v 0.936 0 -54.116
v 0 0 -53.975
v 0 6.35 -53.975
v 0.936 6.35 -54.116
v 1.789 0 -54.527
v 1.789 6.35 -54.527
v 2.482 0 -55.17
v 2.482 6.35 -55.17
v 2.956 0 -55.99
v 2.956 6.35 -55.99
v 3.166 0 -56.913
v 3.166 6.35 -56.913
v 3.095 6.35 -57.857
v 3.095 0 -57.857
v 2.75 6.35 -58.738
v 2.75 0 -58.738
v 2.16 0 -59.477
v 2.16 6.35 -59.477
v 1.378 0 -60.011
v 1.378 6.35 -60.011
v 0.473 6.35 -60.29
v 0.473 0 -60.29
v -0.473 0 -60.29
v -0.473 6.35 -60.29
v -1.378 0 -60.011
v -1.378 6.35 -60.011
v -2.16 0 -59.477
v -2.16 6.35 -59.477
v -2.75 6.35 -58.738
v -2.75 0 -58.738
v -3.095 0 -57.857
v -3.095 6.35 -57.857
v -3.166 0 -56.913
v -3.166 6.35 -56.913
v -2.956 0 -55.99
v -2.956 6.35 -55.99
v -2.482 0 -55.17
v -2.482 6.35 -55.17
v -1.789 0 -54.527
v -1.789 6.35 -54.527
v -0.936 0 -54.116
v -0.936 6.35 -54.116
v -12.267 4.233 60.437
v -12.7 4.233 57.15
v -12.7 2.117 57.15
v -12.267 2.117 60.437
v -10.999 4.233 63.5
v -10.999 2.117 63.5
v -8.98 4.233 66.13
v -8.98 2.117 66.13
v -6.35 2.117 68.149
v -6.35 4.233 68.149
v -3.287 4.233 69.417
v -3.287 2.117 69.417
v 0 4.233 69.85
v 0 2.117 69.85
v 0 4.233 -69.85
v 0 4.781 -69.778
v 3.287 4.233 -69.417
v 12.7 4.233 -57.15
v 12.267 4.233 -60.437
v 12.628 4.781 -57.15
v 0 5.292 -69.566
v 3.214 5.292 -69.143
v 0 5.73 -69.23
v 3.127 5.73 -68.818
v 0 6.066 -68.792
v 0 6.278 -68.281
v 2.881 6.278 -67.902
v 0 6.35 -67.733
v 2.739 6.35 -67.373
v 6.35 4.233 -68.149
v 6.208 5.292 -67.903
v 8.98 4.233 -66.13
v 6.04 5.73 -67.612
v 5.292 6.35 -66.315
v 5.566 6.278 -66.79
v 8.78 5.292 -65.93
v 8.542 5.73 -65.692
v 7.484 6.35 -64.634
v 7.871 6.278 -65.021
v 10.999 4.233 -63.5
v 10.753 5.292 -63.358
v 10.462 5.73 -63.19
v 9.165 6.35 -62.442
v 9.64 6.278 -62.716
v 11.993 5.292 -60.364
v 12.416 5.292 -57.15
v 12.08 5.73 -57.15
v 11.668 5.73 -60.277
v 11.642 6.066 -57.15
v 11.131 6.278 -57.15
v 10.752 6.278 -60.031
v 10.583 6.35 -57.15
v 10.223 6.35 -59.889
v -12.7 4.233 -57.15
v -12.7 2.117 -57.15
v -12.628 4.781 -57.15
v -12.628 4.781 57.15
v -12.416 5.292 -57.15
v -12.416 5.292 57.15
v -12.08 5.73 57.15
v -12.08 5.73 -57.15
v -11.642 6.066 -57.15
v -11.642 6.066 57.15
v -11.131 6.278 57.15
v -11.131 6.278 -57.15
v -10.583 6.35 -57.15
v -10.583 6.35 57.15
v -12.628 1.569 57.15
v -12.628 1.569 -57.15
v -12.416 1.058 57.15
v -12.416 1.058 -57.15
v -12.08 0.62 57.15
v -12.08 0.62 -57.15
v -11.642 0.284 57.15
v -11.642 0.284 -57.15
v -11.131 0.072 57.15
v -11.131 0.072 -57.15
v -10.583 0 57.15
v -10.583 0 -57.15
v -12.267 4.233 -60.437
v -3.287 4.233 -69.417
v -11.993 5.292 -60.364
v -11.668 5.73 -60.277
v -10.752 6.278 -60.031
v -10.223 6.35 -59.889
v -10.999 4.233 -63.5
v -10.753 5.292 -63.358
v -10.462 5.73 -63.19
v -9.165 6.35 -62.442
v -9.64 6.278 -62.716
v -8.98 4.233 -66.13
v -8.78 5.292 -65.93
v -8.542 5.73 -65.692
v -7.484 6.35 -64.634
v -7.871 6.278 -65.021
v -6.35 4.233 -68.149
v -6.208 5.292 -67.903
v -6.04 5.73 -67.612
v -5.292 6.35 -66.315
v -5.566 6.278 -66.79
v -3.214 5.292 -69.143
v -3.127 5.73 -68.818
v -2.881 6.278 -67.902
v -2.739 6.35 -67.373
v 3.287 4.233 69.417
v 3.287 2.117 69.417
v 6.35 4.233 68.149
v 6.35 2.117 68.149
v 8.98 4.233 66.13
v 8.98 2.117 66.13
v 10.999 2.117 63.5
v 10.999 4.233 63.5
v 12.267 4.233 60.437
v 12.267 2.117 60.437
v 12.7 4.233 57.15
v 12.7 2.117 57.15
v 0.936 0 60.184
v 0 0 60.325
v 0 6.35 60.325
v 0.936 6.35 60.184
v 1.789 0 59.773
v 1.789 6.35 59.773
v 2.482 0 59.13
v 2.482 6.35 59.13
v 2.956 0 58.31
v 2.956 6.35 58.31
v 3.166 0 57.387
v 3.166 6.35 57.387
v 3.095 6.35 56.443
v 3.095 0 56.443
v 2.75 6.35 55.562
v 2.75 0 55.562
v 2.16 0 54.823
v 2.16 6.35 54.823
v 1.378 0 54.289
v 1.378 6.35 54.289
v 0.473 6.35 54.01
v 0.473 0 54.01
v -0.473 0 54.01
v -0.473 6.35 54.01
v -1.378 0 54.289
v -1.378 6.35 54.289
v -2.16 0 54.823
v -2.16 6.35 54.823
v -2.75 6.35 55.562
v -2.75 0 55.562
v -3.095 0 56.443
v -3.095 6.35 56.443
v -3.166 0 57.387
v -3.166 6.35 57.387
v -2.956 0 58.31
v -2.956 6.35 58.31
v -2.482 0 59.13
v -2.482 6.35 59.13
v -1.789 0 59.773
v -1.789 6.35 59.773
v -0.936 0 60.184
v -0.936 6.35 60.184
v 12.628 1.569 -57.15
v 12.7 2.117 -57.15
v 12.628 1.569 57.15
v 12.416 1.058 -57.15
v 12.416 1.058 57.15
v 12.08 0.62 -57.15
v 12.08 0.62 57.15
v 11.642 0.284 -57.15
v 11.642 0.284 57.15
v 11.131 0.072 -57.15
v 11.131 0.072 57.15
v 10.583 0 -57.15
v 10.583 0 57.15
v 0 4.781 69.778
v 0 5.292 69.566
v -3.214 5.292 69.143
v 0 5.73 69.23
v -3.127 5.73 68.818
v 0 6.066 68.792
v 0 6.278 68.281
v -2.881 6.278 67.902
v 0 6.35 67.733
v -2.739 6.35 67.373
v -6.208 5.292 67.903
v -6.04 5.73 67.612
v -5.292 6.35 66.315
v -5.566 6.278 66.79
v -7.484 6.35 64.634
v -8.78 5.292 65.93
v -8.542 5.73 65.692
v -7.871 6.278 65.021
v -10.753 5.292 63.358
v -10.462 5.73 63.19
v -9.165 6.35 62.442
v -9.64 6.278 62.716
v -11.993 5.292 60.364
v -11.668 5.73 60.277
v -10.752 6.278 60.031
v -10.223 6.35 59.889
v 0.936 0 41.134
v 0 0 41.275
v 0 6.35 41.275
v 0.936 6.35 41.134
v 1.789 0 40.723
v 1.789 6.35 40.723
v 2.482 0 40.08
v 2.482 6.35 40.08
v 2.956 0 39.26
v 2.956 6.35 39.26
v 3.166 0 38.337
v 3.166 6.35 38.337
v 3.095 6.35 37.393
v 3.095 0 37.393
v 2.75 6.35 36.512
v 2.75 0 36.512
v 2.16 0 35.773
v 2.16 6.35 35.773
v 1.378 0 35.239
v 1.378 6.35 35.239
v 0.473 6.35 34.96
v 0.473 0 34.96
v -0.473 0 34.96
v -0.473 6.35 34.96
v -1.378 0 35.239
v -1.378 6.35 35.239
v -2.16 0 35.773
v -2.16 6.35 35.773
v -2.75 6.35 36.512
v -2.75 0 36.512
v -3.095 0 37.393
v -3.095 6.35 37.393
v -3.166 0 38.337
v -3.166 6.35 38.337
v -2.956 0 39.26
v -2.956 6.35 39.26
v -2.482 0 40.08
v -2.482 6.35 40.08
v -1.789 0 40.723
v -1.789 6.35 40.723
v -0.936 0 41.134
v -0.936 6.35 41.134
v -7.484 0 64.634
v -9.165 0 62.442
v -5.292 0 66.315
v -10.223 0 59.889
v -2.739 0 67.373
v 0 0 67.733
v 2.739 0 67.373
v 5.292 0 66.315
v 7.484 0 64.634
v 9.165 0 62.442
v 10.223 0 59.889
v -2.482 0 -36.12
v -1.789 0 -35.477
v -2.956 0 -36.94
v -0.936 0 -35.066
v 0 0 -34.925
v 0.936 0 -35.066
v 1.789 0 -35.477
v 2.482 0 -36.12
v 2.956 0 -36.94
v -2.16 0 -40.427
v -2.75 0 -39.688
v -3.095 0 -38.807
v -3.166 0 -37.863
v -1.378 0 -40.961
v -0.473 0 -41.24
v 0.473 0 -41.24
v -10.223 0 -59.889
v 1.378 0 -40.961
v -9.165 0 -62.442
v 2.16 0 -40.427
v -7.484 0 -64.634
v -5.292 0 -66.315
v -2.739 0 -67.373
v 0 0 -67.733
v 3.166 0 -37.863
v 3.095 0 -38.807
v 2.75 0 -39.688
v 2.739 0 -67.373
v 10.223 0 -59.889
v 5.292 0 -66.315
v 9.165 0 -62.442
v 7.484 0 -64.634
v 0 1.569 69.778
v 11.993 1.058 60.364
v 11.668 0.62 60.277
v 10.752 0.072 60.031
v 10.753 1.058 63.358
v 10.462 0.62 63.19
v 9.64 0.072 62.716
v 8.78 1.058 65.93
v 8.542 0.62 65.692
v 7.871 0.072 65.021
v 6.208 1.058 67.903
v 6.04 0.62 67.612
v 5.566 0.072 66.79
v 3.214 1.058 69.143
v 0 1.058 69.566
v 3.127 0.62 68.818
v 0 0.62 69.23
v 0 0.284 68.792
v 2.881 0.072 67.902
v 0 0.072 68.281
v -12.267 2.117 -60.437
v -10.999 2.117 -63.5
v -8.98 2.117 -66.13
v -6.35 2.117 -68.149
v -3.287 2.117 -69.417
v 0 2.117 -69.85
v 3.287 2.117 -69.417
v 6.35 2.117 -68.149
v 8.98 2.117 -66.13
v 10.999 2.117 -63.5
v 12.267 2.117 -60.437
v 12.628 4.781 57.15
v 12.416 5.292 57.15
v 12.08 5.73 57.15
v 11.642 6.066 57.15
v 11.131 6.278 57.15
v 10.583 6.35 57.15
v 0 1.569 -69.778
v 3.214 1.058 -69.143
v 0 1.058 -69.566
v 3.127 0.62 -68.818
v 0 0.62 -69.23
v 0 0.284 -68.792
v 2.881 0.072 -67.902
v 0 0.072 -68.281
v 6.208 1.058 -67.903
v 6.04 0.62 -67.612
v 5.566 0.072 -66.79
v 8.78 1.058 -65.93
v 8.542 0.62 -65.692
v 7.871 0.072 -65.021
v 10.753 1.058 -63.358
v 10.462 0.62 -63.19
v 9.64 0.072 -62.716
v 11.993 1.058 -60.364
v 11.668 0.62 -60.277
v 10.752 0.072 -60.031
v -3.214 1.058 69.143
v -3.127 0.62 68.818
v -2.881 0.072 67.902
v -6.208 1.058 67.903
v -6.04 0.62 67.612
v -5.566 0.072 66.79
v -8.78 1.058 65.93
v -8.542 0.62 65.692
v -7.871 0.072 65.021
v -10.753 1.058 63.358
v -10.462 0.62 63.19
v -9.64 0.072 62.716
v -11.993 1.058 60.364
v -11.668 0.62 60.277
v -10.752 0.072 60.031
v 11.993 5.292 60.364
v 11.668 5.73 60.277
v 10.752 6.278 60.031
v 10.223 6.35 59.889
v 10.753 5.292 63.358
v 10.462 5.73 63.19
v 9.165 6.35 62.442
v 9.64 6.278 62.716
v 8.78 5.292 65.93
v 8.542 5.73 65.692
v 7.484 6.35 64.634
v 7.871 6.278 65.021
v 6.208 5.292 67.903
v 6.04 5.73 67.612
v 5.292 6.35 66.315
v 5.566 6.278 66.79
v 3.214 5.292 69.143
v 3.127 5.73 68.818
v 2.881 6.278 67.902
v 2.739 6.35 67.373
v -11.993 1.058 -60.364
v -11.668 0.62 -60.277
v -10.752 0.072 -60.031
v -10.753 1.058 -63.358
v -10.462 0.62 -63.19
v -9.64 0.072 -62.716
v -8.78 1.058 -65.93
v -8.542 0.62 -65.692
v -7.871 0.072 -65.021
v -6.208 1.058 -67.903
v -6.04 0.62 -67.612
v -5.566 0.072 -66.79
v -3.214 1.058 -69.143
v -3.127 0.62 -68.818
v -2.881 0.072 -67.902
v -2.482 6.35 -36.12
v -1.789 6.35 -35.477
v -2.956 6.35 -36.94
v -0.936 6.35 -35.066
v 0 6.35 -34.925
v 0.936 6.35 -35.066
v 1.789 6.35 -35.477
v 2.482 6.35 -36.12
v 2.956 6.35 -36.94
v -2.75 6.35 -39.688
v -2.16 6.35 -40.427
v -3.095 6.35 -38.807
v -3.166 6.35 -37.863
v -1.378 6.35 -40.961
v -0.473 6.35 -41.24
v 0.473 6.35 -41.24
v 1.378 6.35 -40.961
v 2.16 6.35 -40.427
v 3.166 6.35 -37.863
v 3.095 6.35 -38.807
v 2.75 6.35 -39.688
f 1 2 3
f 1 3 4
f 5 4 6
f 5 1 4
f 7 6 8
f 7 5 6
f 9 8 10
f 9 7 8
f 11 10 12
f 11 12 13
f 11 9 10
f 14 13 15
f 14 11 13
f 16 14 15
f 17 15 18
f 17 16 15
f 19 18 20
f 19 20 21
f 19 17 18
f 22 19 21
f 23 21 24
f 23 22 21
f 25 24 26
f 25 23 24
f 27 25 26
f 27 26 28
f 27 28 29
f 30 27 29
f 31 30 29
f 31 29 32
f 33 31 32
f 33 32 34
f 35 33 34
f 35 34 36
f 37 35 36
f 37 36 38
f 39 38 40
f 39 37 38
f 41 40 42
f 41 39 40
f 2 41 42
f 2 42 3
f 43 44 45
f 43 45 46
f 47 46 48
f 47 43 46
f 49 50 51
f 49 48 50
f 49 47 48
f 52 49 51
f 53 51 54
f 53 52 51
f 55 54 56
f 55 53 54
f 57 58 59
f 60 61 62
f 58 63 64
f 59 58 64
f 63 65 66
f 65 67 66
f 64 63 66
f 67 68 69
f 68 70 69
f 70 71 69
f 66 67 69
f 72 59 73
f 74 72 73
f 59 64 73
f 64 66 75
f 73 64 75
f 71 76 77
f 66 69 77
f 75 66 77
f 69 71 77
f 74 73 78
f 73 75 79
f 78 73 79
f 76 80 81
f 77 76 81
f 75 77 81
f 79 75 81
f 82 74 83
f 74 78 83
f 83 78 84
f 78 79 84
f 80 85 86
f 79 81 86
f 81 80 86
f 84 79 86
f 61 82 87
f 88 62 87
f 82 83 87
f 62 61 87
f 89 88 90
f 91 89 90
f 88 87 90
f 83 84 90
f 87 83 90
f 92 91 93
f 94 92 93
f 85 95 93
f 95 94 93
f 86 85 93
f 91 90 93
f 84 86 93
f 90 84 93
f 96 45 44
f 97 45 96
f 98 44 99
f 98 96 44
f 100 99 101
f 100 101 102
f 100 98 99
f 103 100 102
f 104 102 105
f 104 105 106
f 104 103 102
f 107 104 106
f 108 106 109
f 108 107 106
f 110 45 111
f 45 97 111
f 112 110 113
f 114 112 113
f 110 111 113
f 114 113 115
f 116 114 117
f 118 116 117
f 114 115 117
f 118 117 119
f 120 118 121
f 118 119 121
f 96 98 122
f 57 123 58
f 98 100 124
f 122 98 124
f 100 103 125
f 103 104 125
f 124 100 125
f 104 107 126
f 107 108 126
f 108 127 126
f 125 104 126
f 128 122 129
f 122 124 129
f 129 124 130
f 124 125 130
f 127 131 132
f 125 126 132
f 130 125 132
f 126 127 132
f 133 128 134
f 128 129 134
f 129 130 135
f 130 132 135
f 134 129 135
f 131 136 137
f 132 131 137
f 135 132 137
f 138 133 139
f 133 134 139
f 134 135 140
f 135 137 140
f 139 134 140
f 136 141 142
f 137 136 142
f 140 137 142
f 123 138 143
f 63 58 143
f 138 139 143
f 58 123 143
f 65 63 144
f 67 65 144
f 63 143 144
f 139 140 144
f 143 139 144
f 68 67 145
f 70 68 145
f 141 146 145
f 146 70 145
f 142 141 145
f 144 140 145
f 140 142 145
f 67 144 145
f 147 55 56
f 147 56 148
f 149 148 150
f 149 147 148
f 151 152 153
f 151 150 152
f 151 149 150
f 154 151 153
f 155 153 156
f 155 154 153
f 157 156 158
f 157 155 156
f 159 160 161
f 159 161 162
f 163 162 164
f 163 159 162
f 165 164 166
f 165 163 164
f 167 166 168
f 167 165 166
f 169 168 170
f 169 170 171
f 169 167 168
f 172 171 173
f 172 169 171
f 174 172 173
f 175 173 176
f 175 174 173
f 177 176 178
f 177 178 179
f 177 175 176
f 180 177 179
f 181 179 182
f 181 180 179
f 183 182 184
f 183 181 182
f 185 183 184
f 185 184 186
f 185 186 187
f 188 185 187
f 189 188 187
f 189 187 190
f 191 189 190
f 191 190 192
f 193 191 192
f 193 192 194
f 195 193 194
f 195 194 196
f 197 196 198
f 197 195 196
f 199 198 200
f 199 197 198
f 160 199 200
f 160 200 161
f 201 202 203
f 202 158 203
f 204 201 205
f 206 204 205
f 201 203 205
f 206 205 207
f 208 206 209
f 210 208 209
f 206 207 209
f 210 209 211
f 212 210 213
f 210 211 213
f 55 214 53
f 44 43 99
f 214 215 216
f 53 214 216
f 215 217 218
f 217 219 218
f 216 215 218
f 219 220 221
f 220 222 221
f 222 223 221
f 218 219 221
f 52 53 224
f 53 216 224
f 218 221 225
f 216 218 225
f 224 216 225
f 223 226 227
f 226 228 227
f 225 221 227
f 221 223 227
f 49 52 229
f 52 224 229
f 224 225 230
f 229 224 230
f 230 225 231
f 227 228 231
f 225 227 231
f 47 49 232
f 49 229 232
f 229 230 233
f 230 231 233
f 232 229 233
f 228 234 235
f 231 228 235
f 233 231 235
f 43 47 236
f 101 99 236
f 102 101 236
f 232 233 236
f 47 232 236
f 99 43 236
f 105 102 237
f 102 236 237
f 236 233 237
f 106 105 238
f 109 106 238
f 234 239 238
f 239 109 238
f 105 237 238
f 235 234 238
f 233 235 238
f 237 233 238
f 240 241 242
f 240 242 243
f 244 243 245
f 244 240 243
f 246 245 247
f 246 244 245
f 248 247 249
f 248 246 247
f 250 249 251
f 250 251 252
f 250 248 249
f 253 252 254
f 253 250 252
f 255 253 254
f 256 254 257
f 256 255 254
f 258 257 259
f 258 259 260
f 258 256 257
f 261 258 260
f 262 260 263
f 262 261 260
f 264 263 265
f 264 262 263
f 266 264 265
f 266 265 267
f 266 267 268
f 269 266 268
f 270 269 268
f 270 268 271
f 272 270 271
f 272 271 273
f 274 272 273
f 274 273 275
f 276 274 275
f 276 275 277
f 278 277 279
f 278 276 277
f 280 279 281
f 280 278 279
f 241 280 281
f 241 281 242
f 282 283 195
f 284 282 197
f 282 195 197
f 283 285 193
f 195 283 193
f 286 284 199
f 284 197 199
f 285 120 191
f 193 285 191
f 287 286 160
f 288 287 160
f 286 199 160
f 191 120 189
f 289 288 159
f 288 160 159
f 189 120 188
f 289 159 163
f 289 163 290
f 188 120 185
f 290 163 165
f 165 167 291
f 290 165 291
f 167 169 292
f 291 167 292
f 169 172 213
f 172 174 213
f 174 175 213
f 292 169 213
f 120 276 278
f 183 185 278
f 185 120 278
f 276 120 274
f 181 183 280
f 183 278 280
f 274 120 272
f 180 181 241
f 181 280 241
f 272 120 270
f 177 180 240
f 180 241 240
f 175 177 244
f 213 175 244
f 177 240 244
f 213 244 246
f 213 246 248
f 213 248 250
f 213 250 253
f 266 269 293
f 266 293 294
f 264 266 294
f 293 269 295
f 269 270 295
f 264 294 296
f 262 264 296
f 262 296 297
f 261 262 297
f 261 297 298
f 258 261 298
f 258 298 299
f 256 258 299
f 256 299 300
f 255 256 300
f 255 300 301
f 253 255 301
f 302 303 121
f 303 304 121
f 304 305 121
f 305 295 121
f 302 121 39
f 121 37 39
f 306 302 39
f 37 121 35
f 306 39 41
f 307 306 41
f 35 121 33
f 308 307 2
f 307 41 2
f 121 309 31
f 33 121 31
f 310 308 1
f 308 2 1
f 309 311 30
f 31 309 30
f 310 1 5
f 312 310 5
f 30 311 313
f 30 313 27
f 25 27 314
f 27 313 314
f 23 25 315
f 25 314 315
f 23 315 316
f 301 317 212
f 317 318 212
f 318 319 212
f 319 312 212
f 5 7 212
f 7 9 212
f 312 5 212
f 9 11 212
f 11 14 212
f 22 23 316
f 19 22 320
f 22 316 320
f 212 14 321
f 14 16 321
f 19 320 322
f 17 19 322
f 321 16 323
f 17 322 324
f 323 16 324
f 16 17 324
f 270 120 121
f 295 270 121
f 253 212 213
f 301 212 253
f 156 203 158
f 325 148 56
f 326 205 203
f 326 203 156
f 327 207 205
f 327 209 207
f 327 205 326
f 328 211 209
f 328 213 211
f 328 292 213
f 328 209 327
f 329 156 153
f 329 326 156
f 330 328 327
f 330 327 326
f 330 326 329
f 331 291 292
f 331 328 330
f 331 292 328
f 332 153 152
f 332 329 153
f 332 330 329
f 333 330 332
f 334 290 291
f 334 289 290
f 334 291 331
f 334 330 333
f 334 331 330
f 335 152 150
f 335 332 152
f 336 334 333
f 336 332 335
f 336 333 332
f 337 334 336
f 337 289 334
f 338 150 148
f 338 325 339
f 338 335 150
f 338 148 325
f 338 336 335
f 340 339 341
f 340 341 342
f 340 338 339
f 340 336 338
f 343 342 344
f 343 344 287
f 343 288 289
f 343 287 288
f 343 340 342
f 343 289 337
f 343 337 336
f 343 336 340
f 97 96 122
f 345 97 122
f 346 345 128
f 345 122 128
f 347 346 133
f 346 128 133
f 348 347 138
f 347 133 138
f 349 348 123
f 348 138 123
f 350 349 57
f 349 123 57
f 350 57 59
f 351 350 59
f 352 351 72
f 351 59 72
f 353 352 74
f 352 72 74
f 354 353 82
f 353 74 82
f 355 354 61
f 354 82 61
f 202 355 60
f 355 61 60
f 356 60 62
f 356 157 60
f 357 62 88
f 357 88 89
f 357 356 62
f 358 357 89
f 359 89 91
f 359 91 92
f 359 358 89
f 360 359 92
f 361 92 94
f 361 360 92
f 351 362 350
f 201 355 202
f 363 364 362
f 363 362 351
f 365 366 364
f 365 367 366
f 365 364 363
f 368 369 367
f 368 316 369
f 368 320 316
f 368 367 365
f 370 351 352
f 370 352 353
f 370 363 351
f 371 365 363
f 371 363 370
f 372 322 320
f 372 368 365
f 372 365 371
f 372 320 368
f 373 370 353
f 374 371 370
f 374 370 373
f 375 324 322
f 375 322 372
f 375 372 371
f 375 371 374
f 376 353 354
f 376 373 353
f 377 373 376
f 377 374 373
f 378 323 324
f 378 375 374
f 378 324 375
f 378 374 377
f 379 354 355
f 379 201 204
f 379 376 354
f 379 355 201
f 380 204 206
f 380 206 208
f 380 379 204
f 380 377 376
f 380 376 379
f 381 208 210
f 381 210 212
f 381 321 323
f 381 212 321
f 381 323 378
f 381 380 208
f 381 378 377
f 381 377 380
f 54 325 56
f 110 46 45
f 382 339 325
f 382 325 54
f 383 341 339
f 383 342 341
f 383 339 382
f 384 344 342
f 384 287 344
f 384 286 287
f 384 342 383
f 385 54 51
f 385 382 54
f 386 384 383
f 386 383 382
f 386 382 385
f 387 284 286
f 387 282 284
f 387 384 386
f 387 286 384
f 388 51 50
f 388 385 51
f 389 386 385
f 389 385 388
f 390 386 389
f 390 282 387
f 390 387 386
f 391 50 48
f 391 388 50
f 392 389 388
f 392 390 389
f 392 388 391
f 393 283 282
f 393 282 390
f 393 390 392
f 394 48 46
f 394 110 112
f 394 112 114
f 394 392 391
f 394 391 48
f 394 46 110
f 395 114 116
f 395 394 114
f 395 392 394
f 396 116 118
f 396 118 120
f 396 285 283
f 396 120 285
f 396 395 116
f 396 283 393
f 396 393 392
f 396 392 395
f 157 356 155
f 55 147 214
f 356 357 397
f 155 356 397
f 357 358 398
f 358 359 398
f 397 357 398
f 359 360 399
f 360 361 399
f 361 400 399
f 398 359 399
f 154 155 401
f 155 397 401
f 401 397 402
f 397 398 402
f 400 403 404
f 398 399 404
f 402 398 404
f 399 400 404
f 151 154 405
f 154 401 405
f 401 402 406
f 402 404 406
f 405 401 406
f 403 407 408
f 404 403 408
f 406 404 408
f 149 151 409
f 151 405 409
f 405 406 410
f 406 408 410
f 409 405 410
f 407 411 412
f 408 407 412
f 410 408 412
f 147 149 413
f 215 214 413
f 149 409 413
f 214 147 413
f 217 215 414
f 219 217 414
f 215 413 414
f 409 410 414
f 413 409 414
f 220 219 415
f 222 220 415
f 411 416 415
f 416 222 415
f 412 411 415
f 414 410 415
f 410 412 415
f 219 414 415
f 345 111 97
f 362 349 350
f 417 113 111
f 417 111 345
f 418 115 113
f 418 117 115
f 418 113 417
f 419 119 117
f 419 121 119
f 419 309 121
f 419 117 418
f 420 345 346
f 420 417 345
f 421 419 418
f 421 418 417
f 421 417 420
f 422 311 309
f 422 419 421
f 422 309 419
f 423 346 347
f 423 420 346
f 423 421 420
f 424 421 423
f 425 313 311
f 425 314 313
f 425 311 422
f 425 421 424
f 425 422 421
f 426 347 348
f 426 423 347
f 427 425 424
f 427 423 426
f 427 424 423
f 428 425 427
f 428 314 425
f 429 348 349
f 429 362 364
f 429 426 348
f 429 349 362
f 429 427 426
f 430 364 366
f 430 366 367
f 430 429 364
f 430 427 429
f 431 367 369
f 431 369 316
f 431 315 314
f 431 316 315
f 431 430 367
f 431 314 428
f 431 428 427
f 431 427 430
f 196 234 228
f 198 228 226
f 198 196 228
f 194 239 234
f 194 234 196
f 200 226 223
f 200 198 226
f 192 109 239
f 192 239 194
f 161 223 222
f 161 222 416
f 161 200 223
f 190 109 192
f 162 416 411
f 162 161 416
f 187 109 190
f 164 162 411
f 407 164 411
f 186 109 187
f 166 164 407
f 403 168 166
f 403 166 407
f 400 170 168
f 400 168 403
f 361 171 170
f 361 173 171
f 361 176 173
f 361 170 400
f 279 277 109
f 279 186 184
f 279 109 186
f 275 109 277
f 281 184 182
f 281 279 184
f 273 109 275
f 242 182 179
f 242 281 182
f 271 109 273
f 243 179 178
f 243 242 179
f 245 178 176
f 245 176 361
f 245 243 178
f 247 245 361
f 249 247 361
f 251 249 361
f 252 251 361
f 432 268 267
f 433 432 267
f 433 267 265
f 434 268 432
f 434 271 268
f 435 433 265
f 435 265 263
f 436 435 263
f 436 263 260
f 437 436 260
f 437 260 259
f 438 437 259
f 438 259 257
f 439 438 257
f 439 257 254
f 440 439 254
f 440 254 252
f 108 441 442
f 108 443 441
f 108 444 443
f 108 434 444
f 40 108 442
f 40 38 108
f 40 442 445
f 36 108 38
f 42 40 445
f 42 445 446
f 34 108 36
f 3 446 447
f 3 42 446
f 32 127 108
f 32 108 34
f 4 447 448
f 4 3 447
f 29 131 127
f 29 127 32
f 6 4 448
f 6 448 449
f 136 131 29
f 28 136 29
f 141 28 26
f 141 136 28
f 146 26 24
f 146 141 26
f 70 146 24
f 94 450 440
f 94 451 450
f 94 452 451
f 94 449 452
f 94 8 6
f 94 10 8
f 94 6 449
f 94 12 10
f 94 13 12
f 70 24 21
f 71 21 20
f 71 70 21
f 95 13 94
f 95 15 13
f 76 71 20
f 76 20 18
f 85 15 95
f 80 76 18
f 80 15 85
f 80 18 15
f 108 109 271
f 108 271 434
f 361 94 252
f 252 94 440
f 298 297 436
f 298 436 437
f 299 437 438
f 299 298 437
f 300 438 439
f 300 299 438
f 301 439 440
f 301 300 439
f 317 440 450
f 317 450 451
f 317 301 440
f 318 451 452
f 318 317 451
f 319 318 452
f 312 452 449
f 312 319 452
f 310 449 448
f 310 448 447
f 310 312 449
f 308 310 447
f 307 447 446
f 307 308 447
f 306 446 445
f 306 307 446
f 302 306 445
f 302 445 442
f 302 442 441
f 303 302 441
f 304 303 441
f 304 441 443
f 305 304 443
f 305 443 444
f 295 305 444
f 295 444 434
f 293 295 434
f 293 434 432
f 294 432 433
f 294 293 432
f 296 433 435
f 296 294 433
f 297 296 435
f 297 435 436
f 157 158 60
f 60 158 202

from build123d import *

# Parameters (mm, degrees)
SKETCH1_W           = 25.4
SKETCH1_H           = 139.7
SKETCH1_R           = 3.175
BOSS_EXTRUDE1_DEPTH = 6.35
FILLET2_R           = 12.7
FILLET3_R           = 2.116666667


with BuildPart() as part:
    # Sketch1 → Boss-Extrude1 (new body)
    with BuildSketch(Plane(origin=(0, 0, 0), x_dir=(1, 0, 0), z_dir=(0, 1, 0))):
        Rectangle(SKETCH1_W, SKETCH1_H)
        with Locations(Location((0, -57.15, 0), (0, 0, 270))):
            Circle(SKETCH1_R, mode=Mode.SUBTRACT)
        with Locations(Location((0, 38.1, 0), (0, 0, 270))):
            Circle(SKETCH1_R, mode=Mode.SUBTRACT)
        with Locations(Location((0, 57.15, 0), (0, 0, 270))):
            Circle(SKETCH1_R, mode=Mode.SUBTRACT)
        with Locations(Location((0, -38.1, 0), (0, 0, 270))):
            Circle(SKETCH1_R, mode=Mode.SUBTRACT)
    extrude(amount=BOSS_EXTRUDE1_DEPTH)

    # Fillet2
    fillet2_edges = [part.edges().sort_by_distance(p)[0] for p in [
        (-12.7, 3.175, -69.85),
        (12.7, 3.175, -69.85),
        (-12.7, 3.175, 69.85),
        (12.7, 3.175, 69.85),
    ]]
    fillet(fillet2_edges, radius=FILLET2_R - 0.0001)  # a hair under: the kernel refuses the full size

    # Fillet3
    fillet3_edges = [part.edges().sort_by_distance(p)[0] for p in [
        (-12.7, 0, 0),
        (-12.7, 6.35, 0),
        (12.7, 0, 0),
        (8.98028541, 0, 66.13028541),
        (-8.98028541, 0, 66.13028541),
        (8.98028541, 0, -66.13028541),
        (-8.98028541, 0, -66.13028541),
        (12.7, 6.35, 0),
        (8.98028541, 6.35, 66.13028541),
        (-8.98028541, 6.35, 66.13028541),
        (8.98028541, 6.35, -66.13028541),
        (-8.98028541, 6.35, -66.13028541),
    ]]
    fillet(fillet3_edges, radius=FILLET3_R)


solid = part.part
